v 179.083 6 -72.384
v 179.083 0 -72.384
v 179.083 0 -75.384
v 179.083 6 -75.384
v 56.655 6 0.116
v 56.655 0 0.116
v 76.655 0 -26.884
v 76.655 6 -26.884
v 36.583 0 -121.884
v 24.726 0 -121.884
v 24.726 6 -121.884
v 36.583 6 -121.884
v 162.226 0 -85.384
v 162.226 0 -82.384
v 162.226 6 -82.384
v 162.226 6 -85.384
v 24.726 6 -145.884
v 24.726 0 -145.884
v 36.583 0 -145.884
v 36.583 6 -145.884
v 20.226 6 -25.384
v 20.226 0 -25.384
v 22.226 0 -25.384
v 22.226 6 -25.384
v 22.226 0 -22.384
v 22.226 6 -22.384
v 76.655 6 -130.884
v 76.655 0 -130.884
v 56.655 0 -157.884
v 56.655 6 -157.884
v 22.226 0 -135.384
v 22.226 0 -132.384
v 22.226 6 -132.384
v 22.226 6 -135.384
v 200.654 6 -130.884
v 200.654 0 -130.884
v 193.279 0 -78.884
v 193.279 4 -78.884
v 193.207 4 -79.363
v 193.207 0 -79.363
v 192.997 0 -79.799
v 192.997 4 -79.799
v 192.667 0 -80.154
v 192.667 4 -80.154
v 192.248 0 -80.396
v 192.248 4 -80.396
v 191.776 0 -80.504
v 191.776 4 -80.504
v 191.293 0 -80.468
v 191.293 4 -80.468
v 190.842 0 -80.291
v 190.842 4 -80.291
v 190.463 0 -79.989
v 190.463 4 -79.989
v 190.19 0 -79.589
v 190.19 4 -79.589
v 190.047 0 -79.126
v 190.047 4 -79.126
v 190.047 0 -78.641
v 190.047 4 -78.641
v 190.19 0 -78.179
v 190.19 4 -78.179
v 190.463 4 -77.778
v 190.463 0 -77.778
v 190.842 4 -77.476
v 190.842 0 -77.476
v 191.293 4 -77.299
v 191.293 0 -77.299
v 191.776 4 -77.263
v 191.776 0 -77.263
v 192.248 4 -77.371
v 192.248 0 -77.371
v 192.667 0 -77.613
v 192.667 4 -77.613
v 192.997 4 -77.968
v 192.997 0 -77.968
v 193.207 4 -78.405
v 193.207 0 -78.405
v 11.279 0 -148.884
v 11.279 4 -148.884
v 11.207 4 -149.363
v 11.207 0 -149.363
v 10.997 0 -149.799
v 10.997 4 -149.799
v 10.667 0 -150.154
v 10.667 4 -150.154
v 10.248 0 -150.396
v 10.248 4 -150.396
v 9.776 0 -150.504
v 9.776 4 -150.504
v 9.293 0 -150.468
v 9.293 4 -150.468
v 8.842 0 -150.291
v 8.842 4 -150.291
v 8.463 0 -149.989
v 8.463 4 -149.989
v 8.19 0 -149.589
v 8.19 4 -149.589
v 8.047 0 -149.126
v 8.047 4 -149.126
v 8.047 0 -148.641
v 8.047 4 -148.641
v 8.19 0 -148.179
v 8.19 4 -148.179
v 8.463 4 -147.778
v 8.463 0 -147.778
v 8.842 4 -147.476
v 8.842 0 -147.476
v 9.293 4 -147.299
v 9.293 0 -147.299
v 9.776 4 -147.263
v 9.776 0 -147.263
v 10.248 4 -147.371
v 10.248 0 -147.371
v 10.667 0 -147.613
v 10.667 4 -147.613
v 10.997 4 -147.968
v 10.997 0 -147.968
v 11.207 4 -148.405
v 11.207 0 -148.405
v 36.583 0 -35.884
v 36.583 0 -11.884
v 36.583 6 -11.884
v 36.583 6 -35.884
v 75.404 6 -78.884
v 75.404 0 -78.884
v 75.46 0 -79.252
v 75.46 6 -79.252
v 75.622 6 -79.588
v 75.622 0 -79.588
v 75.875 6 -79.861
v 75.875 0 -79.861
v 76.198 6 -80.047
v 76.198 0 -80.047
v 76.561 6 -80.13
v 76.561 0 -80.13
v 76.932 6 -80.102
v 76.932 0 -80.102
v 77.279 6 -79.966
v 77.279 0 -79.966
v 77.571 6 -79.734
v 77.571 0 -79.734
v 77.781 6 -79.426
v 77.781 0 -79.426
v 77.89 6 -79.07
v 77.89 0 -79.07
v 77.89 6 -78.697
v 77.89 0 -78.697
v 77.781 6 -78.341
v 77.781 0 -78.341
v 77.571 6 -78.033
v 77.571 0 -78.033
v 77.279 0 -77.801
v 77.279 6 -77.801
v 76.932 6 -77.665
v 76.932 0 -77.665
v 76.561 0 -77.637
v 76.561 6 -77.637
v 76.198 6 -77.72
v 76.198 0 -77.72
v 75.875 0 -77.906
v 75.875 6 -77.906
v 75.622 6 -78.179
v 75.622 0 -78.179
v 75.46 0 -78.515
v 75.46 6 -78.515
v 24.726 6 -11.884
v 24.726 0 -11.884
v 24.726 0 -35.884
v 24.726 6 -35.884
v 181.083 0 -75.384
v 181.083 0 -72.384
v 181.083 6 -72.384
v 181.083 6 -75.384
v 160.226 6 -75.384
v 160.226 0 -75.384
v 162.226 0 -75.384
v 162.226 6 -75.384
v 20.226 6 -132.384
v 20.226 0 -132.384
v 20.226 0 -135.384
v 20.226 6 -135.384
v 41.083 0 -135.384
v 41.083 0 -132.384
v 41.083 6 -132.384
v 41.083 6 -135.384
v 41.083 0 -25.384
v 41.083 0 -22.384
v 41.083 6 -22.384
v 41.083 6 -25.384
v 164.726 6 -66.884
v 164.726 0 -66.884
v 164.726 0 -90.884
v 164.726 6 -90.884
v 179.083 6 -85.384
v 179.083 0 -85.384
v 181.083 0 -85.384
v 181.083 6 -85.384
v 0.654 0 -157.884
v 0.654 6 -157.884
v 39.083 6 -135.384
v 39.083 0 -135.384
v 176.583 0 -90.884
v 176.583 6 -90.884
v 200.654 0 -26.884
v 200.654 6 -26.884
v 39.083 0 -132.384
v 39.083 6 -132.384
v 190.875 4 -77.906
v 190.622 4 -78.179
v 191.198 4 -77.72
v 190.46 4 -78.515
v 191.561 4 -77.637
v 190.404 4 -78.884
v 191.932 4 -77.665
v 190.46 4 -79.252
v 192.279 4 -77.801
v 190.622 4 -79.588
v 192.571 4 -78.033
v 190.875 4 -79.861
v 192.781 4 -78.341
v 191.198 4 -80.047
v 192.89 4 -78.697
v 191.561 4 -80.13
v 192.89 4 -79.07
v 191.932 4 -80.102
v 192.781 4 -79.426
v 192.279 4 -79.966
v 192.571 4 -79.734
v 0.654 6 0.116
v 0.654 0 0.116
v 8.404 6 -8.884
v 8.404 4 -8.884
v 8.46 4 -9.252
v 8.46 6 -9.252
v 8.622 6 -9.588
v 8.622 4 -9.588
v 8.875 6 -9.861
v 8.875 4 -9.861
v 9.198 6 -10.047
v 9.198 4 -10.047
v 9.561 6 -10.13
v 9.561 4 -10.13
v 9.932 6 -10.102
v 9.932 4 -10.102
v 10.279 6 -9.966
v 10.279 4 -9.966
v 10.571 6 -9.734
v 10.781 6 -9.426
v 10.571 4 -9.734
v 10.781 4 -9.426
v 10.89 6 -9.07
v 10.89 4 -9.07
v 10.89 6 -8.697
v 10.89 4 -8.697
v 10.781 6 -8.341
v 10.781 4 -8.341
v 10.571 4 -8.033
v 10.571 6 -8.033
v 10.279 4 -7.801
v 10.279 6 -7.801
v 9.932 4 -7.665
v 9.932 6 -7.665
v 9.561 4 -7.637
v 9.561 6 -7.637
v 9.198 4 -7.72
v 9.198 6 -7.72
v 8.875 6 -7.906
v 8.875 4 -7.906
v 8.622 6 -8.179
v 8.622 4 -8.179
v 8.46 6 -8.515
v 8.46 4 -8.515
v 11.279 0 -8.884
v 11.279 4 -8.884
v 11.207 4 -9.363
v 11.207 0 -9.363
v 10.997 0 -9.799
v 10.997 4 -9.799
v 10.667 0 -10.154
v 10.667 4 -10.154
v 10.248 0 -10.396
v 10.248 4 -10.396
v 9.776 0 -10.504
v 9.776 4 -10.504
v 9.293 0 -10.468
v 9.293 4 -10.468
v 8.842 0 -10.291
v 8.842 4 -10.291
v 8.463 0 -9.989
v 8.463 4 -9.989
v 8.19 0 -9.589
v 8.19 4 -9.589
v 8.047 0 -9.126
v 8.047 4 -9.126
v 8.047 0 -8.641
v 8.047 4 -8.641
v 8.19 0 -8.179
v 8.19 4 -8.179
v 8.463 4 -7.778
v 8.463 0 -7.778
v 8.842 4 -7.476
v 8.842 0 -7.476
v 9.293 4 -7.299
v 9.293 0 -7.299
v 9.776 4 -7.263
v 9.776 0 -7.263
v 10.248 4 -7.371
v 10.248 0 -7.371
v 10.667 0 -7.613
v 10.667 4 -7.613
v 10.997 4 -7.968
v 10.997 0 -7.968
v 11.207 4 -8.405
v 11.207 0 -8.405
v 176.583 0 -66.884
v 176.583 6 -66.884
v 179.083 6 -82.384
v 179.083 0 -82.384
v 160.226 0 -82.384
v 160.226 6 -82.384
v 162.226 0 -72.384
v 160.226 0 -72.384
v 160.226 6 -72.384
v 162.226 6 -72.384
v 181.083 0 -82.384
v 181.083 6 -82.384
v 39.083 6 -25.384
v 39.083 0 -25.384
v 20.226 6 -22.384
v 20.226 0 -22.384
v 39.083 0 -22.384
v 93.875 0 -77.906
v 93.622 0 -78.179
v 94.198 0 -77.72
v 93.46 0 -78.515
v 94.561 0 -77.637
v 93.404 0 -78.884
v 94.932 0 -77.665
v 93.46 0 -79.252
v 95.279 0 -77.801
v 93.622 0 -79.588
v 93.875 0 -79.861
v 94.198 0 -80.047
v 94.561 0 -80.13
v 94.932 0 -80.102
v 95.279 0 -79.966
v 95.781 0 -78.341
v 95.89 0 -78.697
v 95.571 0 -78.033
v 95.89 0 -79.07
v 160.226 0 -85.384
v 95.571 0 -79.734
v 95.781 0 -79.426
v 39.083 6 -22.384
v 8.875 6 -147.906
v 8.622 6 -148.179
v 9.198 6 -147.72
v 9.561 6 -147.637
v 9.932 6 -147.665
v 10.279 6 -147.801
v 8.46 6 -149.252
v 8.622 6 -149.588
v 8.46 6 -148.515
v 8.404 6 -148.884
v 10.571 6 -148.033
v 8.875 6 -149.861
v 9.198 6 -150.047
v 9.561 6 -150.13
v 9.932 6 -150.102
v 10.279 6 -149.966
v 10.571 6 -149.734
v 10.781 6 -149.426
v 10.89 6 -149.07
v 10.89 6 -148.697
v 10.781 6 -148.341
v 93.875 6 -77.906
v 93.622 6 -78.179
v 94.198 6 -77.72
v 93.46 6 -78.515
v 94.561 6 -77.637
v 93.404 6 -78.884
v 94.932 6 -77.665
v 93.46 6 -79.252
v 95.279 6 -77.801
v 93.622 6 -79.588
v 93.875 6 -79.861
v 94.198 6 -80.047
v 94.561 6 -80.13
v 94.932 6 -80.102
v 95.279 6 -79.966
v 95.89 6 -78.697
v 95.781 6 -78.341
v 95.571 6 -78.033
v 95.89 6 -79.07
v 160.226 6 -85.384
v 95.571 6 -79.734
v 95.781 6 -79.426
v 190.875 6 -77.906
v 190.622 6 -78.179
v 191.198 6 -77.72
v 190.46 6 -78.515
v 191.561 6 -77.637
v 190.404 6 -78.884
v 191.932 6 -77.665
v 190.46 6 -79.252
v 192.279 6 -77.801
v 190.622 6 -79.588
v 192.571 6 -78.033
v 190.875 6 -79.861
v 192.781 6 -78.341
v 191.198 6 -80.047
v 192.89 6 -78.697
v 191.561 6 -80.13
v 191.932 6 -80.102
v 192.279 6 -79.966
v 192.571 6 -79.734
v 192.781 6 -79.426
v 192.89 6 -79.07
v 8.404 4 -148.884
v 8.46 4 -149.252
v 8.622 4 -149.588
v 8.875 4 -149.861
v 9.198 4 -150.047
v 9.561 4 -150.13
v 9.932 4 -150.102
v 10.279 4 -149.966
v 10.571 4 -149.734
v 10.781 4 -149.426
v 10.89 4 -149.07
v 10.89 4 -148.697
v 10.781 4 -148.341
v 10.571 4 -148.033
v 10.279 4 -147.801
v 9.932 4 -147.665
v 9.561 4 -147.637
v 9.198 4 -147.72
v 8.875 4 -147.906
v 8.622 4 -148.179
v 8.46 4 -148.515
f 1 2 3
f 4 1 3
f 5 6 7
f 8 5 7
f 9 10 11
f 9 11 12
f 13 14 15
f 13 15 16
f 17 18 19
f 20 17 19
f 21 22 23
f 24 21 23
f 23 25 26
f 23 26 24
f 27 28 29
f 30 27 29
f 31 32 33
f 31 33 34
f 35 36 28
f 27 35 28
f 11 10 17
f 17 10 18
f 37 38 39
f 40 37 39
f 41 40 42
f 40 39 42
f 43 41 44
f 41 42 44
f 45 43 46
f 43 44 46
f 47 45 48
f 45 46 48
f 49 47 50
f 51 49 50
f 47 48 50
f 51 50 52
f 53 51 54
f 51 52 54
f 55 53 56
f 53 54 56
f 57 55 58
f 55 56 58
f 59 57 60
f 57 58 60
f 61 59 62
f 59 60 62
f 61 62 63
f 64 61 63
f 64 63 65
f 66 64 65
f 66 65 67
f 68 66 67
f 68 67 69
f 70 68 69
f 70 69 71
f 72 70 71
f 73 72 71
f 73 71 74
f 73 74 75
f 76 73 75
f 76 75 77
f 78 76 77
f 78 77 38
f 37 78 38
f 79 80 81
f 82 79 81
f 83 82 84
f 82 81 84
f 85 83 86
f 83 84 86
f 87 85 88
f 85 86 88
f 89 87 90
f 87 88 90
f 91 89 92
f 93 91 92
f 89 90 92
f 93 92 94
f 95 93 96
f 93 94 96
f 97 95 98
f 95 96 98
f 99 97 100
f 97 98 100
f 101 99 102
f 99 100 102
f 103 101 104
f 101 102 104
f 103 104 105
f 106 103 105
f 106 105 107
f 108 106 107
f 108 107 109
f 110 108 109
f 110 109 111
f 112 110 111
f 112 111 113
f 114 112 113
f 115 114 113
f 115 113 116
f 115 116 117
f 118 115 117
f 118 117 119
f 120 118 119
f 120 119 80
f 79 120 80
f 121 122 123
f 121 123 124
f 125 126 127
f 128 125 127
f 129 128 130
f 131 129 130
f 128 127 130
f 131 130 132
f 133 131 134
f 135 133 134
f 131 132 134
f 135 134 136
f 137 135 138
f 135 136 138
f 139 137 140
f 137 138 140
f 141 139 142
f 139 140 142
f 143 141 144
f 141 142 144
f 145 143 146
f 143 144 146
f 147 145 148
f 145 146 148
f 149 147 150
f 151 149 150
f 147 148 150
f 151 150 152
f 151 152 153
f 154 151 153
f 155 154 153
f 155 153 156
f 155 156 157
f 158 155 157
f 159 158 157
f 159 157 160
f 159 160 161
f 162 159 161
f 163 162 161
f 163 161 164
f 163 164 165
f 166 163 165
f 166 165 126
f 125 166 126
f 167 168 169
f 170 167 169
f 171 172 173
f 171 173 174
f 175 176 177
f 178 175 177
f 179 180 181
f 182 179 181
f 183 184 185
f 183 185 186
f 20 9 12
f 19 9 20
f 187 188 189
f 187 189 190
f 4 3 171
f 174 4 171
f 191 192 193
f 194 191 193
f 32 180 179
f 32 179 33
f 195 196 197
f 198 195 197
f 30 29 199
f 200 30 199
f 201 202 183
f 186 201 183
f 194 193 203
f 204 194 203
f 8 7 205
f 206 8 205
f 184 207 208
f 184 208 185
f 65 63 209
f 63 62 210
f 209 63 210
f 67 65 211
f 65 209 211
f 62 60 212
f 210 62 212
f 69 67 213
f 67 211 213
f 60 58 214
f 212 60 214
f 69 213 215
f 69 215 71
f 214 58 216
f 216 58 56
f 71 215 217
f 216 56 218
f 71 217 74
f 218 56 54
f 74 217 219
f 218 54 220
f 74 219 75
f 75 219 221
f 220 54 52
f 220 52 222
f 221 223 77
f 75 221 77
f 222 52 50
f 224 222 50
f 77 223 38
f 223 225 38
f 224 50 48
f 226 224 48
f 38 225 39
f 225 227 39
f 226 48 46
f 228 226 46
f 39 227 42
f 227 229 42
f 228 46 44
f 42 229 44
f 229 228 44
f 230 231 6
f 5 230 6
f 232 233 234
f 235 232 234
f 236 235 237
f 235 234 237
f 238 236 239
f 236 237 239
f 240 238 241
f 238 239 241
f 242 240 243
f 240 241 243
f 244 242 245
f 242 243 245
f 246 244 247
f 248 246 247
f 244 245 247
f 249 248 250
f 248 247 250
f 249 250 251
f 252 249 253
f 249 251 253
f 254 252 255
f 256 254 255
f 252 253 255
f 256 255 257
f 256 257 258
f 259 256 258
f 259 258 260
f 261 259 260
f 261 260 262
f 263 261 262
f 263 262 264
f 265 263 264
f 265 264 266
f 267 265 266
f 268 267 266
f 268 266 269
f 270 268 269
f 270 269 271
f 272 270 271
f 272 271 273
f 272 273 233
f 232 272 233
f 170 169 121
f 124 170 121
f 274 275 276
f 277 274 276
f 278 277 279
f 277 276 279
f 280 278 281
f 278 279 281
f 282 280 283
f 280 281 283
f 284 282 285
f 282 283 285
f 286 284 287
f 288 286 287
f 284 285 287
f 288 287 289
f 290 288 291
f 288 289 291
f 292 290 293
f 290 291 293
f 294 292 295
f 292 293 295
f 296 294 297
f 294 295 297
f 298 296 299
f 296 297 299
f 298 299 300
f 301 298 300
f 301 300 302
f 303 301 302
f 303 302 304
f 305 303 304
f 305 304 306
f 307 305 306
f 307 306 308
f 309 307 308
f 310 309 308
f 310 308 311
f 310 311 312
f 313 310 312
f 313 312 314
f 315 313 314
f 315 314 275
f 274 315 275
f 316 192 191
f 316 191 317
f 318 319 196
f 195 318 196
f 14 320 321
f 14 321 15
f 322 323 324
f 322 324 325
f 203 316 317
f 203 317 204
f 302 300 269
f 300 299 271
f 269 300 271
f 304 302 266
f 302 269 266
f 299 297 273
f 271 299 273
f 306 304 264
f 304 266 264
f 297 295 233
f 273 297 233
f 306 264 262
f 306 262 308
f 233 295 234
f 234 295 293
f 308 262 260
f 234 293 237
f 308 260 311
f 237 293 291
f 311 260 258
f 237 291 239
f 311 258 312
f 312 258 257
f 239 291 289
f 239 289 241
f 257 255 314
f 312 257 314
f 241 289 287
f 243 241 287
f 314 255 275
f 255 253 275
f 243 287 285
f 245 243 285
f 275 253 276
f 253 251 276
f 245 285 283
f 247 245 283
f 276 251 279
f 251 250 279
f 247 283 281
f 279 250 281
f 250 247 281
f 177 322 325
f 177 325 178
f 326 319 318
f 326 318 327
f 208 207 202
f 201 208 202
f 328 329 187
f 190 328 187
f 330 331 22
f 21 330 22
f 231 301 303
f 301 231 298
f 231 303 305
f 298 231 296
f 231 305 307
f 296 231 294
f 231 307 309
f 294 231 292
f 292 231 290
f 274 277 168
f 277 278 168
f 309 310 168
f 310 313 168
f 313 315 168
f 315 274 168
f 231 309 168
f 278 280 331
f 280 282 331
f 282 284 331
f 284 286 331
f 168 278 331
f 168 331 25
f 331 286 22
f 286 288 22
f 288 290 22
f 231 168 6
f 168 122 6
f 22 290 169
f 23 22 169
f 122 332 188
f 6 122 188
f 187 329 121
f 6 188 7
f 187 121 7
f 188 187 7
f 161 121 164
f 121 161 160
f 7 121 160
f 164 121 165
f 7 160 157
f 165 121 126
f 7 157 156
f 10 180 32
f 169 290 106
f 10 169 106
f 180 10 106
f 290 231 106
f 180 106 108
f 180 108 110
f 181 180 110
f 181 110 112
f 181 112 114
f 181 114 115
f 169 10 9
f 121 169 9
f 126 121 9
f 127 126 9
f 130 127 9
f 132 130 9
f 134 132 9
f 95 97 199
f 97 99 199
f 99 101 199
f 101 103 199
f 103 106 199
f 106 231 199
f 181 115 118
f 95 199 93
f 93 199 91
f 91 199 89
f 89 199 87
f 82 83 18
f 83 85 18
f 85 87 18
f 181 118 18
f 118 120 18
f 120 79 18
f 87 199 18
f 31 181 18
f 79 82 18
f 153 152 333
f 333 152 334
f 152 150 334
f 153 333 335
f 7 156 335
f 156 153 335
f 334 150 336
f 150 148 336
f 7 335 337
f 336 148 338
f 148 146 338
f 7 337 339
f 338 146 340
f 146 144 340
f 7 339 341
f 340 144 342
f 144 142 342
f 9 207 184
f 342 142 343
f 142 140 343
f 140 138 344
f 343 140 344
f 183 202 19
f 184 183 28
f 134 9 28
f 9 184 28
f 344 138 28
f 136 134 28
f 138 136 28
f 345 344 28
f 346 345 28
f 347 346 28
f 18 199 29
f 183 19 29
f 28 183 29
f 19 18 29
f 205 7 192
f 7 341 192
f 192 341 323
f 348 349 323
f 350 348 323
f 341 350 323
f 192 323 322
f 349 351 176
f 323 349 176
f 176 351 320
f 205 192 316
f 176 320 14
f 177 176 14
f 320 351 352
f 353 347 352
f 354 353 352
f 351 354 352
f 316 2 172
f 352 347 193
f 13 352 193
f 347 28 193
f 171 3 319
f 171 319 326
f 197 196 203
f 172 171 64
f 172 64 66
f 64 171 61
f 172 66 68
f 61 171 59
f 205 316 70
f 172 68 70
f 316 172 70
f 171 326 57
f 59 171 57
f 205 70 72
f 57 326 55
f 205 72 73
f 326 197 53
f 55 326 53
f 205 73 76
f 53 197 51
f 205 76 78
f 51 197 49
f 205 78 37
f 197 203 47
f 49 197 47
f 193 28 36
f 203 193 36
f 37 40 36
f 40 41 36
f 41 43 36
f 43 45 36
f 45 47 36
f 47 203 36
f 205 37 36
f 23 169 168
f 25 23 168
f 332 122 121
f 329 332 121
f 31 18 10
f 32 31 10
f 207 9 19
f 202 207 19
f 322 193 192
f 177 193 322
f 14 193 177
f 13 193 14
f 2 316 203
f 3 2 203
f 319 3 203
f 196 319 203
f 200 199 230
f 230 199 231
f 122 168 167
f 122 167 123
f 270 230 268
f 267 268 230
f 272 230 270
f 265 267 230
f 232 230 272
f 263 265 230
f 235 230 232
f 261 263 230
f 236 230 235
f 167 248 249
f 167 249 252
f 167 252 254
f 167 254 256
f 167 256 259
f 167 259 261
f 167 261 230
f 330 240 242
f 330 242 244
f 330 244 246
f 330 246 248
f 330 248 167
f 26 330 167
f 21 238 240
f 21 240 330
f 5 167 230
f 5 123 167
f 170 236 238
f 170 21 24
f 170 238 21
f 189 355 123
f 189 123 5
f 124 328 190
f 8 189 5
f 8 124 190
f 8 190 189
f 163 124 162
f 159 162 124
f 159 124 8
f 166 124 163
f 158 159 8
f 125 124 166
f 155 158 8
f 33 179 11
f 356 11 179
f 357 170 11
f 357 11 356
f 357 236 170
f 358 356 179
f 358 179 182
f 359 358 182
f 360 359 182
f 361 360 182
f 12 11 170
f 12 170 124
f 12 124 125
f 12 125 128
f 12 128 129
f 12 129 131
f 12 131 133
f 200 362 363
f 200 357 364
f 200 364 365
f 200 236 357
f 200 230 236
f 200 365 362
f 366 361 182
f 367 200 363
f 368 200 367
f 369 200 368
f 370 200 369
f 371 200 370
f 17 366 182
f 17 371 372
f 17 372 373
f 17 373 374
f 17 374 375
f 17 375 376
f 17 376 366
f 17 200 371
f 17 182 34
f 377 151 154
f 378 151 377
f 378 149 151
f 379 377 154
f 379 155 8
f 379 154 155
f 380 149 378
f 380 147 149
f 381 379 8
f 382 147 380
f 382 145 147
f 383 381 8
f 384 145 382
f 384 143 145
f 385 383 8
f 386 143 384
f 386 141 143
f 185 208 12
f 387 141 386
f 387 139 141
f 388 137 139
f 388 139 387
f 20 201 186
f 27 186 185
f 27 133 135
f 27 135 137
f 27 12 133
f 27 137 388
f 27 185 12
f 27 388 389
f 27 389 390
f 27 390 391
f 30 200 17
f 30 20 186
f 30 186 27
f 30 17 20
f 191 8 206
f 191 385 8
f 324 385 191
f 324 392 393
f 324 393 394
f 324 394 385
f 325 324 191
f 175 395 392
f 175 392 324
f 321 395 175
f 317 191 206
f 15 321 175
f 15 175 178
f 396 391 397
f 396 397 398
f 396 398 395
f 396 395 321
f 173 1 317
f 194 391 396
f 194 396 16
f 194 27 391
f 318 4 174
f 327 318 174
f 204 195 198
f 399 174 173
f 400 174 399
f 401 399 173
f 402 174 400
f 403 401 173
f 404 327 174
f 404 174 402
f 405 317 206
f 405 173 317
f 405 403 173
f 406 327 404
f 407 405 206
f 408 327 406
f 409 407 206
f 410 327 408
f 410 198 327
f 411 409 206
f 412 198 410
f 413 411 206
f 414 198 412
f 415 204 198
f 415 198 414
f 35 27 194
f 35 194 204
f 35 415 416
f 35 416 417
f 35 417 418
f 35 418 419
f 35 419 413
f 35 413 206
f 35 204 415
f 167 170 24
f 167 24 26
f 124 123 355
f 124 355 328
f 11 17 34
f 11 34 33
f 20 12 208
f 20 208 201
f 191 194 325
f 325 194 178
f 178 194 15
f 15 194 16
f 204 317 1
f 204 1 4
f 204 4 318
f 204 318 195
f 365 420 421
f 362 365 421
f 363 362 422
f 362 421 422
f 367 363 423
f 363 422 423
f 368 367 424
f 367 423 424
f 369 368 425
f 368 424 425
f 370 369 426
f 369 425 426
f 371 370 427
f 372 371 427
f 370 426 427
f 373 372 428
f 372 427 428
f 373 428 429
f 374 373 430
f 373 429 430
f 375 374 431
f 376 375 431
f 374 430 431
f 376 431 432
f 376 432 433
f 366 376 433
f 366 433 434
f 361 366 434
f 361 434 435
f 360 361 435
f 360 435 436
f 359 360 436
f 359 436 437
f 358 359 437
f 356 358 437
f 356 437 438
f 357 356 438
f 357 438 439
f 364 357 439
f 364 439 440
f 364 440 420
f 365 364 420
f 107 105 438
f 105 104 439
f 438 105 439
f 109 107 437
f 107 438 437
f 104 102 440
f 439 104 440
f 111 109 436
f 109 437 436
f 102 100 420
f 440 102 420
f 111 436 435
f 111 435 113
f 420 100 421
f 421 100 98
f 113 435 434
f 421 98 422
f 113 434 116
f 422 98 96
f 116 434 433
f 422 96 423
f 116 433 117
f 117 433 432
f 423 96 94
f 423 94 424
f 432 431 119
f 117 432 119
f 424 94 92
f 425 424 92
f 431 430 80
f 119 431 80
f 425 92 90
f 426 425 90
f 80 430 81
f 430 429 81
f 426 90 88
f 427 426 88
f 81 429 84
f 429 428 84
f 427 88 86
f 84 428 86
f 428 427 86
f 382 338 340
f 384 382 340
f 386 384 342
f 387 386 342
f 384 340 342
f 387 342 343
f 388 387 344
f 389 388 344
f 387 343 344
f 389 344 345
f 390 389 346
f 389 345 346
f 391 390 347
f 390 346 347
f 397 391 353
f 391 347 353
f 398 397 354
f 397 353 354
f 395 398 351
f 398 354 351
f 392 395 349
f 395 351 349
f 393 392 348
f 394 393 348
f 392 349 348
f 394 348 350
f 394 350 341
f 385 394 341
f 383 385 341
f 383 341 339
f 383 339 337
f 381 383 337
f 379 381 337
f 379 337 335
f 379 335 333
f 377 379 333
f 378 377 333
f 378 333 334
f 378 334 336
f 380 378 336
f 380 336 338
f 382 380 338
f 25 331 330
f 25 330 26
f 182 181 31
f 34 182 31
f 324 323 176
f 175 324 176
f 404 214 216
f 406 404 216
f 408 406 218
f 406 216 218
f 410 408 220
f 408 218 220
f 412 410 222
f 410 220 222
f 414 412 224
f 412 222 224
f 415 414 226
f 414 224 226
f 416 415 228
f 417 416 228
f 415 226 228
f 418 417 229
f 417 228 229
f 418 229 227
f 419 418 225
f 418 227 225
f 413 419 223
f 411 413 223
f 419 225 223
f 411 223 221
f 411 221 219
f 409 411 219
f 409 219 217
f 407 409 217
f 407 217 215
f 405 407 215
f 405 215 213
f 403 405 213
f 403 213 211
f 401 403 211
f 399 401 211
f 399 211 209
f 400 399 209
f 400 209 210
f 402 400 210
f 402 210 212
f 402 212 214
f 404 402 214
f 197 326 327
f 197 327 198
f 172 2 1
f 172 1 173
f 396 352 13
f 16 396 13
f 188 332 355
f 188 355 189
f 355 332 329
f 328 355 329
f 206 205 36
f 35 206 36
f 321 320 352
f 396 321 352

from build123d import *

# Parameters (mm, degrees)
ESQUISSE1_W          = 2
ESQUISSE1_H          = 3
ESQUISSE1_W_2        = 11.857650871
ESQUISSE1_H_2        = 24
ESQUISSE1_W_3        = 11.857650872
BOSS_EXTRU_1_DEPTH   = 6
D_GAGEMENT_M2_51_D   = 2.5
D_GAGEMENT_M31_D     = 3.25
D_GAGEMENT_M31_DEPTH = 4


with BuildPart() as part:
    # Esquisse1 → Boss.-Extru.1 (new body)
    with BuildSketch(Plane(origin=(0, 0, 0), x_dir=(1, 0, 0), z_dir=(0, 1, 0))):
        Polygon((200.65431579, 26.883578947), (200.65431579, 130.883578947), (76.654558535, 130.883578947), (56.654558535, 157.883578947), (0.654315789, 157.883578947), (0.654315789, -0.116421053), (56.654558535, -0.116421053), (76.654558535, 26.883578947), align=None)
        with Locations((21.225574277, 133.883578948)):
            Rectangle(ESQUISSE1_W, ESQUISSE1_H, mode=Mode.SUBTRACT)
        with Locations((40.083225148, 133.883578948)):
            Rectangle(ESQUISSE1_W, ESQUISSE1_H, mode=Mode.SUBTRACT)
        with Locations((21.225574277, 23.883578948)):
            Rectangle(ESQUISSE1_W, ESQUISSE1_H, mode=Mode.SUBTRACT)
        with Locations((40.083225148, 23.883578948)):
            Rectangle(ESQUISSE1_W, ESQUISSE1_H, mode=Mode.SUBTRACT)
        with Locations((161.22557428, 73.883578947)):
            Rectangle(ESQUISSE1_W, ESQUISSE1_H, mode=Mode.SUBTRACT)
        with Locations((180.083225144, 83.883578947)):
            Rectangle(ESQUISSE1_W, ESQUISSE1_H, mode=Mode.SUBTRACT)
        with Locations((30.654399713, 133.883578948)):
            Rectangle(ESQUISSE1_W_2, ESQUISSE1_H_2, mode=Mode.SUBTRACT)
        with Locations((30.654399713, 23.883578948)):
            Rectangle(ESQUISSE1_W_2, ESQUISSE1_H_2, mode=Mode.SUBTRACT)
        with Locations((170.654399716, 78.883578947)):
            Rectangle(ESQUISSE1_W_3, ESQUISSE1_H_2, mode=Mode.SUBTRACT)
        with Locations((180.083225144, 73.883578947)):
            Rectangle(ESQUISSE1_W, ESQUISSE1_H, mode=Mode.SUBTRACT)
        with Locations((161.22557428, 83.883578947)):
            Rectangle(ESQUISSE1_W, ESQUISSE1_H, mode=Mode.SUBTRACT)
    extrude(amount=BOSS_EXTRU_1_DEPTH)

    # Dégagement M2.51 (through all)
    with Locations(Plane(origin=(0, 6, 0), x_dir=(1, 0, 0), z_dir=(0, 1, 0))):
        with Locations((9.654315789, 148.883578947), (9.654315789, 8.883578947), (76.654315789, 78.883578947), (94.65431579, 78.883578947), (191.65431579, 78.883578947)):
            Hole(D_GAGEMENT_M2_51_D / 2)

    # Dégagement M31
    with Locations(Plane(origin=(0, 0, 0), x_dir=(-1, 0, 0), z_dir=(0, -1, 0))):
        with Locations((-191.65431579, 78.883578947), (-9.654315789, 8.883578947), (-9.654315789, 148.883578947)):
            Hole(D_GAGEMENT_M31_D / 2, depth=D_GAGEMENT_M31_DEPTH)


solid = part.part
